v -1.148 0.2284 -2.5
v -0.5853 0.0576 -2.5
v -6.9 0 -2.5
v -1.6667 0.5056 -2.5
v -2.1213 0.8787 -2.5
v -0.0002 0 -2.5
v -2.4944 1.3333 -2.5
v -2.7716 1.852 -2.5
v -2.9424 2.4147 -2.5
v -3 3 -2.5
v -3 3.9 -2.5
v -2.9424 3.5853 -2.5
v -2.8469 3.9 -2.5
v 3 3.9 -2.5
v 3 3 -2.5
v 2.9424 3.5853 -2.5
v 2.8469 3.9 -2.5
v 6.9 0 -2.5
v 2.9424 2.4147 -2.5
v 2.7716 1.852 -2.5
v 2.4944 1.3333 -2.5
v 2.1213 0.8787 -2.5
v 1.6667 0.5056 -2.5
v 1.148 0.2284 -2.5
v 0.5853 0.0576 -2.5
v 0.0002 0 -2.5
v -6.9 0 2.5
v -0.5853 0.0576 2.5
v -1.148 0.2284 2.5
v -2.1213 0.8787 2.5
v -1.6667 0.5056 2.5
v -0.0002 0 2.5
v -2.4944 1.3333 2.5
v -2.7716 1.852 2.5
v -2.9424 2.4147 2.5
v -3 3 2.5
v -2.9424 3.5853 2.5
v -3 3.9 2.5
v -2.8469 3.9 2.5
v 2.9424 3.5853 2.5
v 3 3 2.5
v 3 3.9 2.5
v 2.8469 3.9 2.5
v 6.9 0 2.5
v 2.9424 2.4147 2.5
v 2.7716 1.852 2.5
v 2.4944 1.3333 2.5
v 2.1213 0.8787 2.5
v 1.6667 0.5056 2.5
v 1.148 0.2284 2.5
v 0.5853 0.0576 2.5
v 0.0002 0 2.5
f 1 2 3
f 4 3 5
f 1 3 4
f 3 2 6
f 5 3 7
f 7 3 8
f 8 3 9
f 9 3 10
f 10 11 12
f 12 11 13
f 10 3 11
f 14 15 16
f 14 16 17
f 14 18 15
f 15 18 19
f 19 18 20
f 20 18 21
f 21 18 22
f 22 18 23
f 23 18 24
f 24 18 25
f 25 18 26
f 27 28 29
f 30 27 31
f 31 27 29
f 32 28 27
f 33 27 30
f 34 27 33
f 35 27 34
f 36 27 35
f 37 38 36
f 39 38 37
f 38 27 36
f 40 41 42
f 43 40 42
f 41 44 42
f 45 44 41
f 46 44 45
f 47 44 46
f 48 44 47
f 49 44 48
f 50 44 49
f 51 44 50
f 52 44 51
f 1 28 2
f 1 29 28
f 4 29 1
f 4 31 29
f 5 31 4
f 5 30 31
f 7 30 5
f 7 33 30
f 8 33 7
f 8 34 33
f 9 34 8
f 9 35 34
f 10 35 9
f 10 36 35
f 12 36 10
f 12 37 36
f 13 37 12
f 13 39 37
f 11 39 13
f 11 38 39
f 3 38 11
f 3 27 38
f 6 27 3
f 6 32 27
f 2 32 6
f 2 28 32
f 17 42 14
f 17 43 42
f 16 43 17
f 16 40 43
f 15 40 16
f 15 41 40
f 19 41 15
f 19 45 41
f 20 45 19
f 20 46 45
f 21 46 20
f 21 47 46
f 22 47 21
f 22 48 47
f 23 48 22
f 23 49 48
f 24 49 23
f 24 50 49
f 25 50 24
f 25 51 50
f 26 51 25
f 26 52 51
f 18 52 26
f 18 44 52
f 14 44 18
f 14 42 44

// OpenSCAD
// file: isosceles_trapezoid.scad
module isosceles_trapezoid(d = 5, angle = 45, h = 1, height = 1) {
	bevel_width = h/tan(angle);
	base_width = d + 2*bevel_width;
	scale_x = base_width/d;

	// turn back into 2D primitive
	projection()
		// turn flat on x plane
		rotate([90, 0, 0])
			// move back into center
			translate([0, 0, -h/2])
				// extrude with scaling into trapezoid
				linear_extrude(height = h, scale=[scale_x, 1])
					square([d, 1], center = true);
}

isosceles_trapezoid();
// main file
$fn = 32;

use <isosceles_trapezoid.scad>;

function tube_holder_outer_length(tube_diameter) = tube_diameter;

// derive bevel width from thickness so that actual bevel thickness equals
// thickness
function tube_holder_outer_height(tube_diameter, clip_factor) =
	tube_diameter/2 * (1 + clip_factor);

// allow users to query the base width of the holder so they know what room
// they must make for attaching it somewhere
function tube_holder_base_length(tube_diameter, angle, clip_factor) =
	let(bevel_width = tube_holder_outer_height(tube_diameter, clip_factor) / tan(angle))
	tube_holder_outer_length(tube_diameter) + 2*bevel_width;

module tube_holder(holder_width = 5, tube_diameter = 6, clip_factor = 0.3,
		thickness = 1.5, angle = 45) {
	outer_height = tube_holder_outer_height(tube_diameter, clip_factor);

	// move to a zero line in y direction and otherwise in center
	// so we can put it on top of other stuff
	translate([0, tube_diameter/2, -holder_width/2])
		linear_extrude(holder_width)
			difference() {
				// beveled for more technical look and better
				// overhang printing
				translate([0, -tube_diameter/2 + outer_height/2, 0])
					isosceles_trapezoid(d = tube_holder_outer_length(tube_diameter),
						h = outer_height, angle = angle);
				circle(d = tube_diameter);
			}
}

tube_holder();
